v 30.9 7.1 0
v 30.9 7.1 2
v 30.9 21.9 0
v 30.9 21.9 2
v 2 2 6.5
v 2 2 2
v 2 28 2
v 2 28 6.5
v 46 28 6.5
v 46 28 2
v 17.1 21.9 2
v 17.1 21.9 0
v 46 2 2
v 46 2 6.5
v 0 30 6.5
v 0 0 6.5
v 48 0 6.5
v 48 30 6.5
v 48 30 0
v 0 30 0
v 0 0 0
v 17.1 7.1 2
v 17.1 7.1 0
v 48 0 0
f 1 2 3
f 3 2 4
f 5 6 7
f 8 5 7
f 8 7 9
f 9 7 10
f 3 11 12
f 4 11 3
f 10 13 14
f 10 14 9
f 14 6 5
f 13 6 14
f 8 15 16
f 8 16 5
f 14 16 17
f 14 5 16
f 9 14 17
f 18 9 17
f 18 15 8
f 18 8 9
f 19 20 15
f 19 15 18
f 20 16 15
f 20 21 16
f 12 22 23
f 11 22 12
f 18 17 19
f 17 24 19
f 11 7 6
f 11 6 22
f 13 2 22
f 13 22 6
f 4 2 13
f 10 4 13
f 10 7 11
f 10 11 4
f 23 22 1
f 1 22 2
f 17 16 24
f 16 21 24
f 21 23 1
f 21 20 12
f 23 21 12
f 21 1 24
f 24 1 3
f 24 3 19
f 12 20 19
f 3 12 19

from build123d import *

# Parameters (mm, degrees)
SKETCH_W      = 48
SKETCH_H      = 30
PAD_DEPTH     = 2
SKETCH001_W   = 48
SKETCH001_H   = 30
SKETCH001_W_2 = 44
SKETCH001_H_2 = 26
PAD001_DEPTH  = 4.5
SKETCH002_W   = 13.8
SKETCH002_H   = 14.8
POCKET_DEPTH  = 2


with BuildPart() as part:
    # Sketch → Pad (new body)
    with BuildSketch(Plane.XY):
        with Locations((24, 15)):
            Rectangle(SKETCH_W, SKETCH_H)
    extrude(amount=PAD_DEPTH)

    # Sketch001 (on Face6 of Pad) → Pad001 (join)
    with BuildSketch(Plane.XY.offset(2)):
        with Locations((24, 15)):
            Rectangle(SKETCH001_W, SKETCH001_H)
        with Locations((24, 15)):
            Rectangle(SKETCH001_W_2, SKETCH001_H_2, mode=Mode.SUBTRACT)
    extrude(amount=PAD001_DEPTH)

    # Sketch002 (on Face15 of Pad001) → Pocket (cut)
    with BuildSketch(Plane.XY.offset(2)):
        with Locations((24, 14.5)):
            Rectangle(SKETCH002_W, SKETCH002_H)
    extrude(amount=-POCKET_DEPTH, mode=Mode.SUBTRACT)


solid = part.part
